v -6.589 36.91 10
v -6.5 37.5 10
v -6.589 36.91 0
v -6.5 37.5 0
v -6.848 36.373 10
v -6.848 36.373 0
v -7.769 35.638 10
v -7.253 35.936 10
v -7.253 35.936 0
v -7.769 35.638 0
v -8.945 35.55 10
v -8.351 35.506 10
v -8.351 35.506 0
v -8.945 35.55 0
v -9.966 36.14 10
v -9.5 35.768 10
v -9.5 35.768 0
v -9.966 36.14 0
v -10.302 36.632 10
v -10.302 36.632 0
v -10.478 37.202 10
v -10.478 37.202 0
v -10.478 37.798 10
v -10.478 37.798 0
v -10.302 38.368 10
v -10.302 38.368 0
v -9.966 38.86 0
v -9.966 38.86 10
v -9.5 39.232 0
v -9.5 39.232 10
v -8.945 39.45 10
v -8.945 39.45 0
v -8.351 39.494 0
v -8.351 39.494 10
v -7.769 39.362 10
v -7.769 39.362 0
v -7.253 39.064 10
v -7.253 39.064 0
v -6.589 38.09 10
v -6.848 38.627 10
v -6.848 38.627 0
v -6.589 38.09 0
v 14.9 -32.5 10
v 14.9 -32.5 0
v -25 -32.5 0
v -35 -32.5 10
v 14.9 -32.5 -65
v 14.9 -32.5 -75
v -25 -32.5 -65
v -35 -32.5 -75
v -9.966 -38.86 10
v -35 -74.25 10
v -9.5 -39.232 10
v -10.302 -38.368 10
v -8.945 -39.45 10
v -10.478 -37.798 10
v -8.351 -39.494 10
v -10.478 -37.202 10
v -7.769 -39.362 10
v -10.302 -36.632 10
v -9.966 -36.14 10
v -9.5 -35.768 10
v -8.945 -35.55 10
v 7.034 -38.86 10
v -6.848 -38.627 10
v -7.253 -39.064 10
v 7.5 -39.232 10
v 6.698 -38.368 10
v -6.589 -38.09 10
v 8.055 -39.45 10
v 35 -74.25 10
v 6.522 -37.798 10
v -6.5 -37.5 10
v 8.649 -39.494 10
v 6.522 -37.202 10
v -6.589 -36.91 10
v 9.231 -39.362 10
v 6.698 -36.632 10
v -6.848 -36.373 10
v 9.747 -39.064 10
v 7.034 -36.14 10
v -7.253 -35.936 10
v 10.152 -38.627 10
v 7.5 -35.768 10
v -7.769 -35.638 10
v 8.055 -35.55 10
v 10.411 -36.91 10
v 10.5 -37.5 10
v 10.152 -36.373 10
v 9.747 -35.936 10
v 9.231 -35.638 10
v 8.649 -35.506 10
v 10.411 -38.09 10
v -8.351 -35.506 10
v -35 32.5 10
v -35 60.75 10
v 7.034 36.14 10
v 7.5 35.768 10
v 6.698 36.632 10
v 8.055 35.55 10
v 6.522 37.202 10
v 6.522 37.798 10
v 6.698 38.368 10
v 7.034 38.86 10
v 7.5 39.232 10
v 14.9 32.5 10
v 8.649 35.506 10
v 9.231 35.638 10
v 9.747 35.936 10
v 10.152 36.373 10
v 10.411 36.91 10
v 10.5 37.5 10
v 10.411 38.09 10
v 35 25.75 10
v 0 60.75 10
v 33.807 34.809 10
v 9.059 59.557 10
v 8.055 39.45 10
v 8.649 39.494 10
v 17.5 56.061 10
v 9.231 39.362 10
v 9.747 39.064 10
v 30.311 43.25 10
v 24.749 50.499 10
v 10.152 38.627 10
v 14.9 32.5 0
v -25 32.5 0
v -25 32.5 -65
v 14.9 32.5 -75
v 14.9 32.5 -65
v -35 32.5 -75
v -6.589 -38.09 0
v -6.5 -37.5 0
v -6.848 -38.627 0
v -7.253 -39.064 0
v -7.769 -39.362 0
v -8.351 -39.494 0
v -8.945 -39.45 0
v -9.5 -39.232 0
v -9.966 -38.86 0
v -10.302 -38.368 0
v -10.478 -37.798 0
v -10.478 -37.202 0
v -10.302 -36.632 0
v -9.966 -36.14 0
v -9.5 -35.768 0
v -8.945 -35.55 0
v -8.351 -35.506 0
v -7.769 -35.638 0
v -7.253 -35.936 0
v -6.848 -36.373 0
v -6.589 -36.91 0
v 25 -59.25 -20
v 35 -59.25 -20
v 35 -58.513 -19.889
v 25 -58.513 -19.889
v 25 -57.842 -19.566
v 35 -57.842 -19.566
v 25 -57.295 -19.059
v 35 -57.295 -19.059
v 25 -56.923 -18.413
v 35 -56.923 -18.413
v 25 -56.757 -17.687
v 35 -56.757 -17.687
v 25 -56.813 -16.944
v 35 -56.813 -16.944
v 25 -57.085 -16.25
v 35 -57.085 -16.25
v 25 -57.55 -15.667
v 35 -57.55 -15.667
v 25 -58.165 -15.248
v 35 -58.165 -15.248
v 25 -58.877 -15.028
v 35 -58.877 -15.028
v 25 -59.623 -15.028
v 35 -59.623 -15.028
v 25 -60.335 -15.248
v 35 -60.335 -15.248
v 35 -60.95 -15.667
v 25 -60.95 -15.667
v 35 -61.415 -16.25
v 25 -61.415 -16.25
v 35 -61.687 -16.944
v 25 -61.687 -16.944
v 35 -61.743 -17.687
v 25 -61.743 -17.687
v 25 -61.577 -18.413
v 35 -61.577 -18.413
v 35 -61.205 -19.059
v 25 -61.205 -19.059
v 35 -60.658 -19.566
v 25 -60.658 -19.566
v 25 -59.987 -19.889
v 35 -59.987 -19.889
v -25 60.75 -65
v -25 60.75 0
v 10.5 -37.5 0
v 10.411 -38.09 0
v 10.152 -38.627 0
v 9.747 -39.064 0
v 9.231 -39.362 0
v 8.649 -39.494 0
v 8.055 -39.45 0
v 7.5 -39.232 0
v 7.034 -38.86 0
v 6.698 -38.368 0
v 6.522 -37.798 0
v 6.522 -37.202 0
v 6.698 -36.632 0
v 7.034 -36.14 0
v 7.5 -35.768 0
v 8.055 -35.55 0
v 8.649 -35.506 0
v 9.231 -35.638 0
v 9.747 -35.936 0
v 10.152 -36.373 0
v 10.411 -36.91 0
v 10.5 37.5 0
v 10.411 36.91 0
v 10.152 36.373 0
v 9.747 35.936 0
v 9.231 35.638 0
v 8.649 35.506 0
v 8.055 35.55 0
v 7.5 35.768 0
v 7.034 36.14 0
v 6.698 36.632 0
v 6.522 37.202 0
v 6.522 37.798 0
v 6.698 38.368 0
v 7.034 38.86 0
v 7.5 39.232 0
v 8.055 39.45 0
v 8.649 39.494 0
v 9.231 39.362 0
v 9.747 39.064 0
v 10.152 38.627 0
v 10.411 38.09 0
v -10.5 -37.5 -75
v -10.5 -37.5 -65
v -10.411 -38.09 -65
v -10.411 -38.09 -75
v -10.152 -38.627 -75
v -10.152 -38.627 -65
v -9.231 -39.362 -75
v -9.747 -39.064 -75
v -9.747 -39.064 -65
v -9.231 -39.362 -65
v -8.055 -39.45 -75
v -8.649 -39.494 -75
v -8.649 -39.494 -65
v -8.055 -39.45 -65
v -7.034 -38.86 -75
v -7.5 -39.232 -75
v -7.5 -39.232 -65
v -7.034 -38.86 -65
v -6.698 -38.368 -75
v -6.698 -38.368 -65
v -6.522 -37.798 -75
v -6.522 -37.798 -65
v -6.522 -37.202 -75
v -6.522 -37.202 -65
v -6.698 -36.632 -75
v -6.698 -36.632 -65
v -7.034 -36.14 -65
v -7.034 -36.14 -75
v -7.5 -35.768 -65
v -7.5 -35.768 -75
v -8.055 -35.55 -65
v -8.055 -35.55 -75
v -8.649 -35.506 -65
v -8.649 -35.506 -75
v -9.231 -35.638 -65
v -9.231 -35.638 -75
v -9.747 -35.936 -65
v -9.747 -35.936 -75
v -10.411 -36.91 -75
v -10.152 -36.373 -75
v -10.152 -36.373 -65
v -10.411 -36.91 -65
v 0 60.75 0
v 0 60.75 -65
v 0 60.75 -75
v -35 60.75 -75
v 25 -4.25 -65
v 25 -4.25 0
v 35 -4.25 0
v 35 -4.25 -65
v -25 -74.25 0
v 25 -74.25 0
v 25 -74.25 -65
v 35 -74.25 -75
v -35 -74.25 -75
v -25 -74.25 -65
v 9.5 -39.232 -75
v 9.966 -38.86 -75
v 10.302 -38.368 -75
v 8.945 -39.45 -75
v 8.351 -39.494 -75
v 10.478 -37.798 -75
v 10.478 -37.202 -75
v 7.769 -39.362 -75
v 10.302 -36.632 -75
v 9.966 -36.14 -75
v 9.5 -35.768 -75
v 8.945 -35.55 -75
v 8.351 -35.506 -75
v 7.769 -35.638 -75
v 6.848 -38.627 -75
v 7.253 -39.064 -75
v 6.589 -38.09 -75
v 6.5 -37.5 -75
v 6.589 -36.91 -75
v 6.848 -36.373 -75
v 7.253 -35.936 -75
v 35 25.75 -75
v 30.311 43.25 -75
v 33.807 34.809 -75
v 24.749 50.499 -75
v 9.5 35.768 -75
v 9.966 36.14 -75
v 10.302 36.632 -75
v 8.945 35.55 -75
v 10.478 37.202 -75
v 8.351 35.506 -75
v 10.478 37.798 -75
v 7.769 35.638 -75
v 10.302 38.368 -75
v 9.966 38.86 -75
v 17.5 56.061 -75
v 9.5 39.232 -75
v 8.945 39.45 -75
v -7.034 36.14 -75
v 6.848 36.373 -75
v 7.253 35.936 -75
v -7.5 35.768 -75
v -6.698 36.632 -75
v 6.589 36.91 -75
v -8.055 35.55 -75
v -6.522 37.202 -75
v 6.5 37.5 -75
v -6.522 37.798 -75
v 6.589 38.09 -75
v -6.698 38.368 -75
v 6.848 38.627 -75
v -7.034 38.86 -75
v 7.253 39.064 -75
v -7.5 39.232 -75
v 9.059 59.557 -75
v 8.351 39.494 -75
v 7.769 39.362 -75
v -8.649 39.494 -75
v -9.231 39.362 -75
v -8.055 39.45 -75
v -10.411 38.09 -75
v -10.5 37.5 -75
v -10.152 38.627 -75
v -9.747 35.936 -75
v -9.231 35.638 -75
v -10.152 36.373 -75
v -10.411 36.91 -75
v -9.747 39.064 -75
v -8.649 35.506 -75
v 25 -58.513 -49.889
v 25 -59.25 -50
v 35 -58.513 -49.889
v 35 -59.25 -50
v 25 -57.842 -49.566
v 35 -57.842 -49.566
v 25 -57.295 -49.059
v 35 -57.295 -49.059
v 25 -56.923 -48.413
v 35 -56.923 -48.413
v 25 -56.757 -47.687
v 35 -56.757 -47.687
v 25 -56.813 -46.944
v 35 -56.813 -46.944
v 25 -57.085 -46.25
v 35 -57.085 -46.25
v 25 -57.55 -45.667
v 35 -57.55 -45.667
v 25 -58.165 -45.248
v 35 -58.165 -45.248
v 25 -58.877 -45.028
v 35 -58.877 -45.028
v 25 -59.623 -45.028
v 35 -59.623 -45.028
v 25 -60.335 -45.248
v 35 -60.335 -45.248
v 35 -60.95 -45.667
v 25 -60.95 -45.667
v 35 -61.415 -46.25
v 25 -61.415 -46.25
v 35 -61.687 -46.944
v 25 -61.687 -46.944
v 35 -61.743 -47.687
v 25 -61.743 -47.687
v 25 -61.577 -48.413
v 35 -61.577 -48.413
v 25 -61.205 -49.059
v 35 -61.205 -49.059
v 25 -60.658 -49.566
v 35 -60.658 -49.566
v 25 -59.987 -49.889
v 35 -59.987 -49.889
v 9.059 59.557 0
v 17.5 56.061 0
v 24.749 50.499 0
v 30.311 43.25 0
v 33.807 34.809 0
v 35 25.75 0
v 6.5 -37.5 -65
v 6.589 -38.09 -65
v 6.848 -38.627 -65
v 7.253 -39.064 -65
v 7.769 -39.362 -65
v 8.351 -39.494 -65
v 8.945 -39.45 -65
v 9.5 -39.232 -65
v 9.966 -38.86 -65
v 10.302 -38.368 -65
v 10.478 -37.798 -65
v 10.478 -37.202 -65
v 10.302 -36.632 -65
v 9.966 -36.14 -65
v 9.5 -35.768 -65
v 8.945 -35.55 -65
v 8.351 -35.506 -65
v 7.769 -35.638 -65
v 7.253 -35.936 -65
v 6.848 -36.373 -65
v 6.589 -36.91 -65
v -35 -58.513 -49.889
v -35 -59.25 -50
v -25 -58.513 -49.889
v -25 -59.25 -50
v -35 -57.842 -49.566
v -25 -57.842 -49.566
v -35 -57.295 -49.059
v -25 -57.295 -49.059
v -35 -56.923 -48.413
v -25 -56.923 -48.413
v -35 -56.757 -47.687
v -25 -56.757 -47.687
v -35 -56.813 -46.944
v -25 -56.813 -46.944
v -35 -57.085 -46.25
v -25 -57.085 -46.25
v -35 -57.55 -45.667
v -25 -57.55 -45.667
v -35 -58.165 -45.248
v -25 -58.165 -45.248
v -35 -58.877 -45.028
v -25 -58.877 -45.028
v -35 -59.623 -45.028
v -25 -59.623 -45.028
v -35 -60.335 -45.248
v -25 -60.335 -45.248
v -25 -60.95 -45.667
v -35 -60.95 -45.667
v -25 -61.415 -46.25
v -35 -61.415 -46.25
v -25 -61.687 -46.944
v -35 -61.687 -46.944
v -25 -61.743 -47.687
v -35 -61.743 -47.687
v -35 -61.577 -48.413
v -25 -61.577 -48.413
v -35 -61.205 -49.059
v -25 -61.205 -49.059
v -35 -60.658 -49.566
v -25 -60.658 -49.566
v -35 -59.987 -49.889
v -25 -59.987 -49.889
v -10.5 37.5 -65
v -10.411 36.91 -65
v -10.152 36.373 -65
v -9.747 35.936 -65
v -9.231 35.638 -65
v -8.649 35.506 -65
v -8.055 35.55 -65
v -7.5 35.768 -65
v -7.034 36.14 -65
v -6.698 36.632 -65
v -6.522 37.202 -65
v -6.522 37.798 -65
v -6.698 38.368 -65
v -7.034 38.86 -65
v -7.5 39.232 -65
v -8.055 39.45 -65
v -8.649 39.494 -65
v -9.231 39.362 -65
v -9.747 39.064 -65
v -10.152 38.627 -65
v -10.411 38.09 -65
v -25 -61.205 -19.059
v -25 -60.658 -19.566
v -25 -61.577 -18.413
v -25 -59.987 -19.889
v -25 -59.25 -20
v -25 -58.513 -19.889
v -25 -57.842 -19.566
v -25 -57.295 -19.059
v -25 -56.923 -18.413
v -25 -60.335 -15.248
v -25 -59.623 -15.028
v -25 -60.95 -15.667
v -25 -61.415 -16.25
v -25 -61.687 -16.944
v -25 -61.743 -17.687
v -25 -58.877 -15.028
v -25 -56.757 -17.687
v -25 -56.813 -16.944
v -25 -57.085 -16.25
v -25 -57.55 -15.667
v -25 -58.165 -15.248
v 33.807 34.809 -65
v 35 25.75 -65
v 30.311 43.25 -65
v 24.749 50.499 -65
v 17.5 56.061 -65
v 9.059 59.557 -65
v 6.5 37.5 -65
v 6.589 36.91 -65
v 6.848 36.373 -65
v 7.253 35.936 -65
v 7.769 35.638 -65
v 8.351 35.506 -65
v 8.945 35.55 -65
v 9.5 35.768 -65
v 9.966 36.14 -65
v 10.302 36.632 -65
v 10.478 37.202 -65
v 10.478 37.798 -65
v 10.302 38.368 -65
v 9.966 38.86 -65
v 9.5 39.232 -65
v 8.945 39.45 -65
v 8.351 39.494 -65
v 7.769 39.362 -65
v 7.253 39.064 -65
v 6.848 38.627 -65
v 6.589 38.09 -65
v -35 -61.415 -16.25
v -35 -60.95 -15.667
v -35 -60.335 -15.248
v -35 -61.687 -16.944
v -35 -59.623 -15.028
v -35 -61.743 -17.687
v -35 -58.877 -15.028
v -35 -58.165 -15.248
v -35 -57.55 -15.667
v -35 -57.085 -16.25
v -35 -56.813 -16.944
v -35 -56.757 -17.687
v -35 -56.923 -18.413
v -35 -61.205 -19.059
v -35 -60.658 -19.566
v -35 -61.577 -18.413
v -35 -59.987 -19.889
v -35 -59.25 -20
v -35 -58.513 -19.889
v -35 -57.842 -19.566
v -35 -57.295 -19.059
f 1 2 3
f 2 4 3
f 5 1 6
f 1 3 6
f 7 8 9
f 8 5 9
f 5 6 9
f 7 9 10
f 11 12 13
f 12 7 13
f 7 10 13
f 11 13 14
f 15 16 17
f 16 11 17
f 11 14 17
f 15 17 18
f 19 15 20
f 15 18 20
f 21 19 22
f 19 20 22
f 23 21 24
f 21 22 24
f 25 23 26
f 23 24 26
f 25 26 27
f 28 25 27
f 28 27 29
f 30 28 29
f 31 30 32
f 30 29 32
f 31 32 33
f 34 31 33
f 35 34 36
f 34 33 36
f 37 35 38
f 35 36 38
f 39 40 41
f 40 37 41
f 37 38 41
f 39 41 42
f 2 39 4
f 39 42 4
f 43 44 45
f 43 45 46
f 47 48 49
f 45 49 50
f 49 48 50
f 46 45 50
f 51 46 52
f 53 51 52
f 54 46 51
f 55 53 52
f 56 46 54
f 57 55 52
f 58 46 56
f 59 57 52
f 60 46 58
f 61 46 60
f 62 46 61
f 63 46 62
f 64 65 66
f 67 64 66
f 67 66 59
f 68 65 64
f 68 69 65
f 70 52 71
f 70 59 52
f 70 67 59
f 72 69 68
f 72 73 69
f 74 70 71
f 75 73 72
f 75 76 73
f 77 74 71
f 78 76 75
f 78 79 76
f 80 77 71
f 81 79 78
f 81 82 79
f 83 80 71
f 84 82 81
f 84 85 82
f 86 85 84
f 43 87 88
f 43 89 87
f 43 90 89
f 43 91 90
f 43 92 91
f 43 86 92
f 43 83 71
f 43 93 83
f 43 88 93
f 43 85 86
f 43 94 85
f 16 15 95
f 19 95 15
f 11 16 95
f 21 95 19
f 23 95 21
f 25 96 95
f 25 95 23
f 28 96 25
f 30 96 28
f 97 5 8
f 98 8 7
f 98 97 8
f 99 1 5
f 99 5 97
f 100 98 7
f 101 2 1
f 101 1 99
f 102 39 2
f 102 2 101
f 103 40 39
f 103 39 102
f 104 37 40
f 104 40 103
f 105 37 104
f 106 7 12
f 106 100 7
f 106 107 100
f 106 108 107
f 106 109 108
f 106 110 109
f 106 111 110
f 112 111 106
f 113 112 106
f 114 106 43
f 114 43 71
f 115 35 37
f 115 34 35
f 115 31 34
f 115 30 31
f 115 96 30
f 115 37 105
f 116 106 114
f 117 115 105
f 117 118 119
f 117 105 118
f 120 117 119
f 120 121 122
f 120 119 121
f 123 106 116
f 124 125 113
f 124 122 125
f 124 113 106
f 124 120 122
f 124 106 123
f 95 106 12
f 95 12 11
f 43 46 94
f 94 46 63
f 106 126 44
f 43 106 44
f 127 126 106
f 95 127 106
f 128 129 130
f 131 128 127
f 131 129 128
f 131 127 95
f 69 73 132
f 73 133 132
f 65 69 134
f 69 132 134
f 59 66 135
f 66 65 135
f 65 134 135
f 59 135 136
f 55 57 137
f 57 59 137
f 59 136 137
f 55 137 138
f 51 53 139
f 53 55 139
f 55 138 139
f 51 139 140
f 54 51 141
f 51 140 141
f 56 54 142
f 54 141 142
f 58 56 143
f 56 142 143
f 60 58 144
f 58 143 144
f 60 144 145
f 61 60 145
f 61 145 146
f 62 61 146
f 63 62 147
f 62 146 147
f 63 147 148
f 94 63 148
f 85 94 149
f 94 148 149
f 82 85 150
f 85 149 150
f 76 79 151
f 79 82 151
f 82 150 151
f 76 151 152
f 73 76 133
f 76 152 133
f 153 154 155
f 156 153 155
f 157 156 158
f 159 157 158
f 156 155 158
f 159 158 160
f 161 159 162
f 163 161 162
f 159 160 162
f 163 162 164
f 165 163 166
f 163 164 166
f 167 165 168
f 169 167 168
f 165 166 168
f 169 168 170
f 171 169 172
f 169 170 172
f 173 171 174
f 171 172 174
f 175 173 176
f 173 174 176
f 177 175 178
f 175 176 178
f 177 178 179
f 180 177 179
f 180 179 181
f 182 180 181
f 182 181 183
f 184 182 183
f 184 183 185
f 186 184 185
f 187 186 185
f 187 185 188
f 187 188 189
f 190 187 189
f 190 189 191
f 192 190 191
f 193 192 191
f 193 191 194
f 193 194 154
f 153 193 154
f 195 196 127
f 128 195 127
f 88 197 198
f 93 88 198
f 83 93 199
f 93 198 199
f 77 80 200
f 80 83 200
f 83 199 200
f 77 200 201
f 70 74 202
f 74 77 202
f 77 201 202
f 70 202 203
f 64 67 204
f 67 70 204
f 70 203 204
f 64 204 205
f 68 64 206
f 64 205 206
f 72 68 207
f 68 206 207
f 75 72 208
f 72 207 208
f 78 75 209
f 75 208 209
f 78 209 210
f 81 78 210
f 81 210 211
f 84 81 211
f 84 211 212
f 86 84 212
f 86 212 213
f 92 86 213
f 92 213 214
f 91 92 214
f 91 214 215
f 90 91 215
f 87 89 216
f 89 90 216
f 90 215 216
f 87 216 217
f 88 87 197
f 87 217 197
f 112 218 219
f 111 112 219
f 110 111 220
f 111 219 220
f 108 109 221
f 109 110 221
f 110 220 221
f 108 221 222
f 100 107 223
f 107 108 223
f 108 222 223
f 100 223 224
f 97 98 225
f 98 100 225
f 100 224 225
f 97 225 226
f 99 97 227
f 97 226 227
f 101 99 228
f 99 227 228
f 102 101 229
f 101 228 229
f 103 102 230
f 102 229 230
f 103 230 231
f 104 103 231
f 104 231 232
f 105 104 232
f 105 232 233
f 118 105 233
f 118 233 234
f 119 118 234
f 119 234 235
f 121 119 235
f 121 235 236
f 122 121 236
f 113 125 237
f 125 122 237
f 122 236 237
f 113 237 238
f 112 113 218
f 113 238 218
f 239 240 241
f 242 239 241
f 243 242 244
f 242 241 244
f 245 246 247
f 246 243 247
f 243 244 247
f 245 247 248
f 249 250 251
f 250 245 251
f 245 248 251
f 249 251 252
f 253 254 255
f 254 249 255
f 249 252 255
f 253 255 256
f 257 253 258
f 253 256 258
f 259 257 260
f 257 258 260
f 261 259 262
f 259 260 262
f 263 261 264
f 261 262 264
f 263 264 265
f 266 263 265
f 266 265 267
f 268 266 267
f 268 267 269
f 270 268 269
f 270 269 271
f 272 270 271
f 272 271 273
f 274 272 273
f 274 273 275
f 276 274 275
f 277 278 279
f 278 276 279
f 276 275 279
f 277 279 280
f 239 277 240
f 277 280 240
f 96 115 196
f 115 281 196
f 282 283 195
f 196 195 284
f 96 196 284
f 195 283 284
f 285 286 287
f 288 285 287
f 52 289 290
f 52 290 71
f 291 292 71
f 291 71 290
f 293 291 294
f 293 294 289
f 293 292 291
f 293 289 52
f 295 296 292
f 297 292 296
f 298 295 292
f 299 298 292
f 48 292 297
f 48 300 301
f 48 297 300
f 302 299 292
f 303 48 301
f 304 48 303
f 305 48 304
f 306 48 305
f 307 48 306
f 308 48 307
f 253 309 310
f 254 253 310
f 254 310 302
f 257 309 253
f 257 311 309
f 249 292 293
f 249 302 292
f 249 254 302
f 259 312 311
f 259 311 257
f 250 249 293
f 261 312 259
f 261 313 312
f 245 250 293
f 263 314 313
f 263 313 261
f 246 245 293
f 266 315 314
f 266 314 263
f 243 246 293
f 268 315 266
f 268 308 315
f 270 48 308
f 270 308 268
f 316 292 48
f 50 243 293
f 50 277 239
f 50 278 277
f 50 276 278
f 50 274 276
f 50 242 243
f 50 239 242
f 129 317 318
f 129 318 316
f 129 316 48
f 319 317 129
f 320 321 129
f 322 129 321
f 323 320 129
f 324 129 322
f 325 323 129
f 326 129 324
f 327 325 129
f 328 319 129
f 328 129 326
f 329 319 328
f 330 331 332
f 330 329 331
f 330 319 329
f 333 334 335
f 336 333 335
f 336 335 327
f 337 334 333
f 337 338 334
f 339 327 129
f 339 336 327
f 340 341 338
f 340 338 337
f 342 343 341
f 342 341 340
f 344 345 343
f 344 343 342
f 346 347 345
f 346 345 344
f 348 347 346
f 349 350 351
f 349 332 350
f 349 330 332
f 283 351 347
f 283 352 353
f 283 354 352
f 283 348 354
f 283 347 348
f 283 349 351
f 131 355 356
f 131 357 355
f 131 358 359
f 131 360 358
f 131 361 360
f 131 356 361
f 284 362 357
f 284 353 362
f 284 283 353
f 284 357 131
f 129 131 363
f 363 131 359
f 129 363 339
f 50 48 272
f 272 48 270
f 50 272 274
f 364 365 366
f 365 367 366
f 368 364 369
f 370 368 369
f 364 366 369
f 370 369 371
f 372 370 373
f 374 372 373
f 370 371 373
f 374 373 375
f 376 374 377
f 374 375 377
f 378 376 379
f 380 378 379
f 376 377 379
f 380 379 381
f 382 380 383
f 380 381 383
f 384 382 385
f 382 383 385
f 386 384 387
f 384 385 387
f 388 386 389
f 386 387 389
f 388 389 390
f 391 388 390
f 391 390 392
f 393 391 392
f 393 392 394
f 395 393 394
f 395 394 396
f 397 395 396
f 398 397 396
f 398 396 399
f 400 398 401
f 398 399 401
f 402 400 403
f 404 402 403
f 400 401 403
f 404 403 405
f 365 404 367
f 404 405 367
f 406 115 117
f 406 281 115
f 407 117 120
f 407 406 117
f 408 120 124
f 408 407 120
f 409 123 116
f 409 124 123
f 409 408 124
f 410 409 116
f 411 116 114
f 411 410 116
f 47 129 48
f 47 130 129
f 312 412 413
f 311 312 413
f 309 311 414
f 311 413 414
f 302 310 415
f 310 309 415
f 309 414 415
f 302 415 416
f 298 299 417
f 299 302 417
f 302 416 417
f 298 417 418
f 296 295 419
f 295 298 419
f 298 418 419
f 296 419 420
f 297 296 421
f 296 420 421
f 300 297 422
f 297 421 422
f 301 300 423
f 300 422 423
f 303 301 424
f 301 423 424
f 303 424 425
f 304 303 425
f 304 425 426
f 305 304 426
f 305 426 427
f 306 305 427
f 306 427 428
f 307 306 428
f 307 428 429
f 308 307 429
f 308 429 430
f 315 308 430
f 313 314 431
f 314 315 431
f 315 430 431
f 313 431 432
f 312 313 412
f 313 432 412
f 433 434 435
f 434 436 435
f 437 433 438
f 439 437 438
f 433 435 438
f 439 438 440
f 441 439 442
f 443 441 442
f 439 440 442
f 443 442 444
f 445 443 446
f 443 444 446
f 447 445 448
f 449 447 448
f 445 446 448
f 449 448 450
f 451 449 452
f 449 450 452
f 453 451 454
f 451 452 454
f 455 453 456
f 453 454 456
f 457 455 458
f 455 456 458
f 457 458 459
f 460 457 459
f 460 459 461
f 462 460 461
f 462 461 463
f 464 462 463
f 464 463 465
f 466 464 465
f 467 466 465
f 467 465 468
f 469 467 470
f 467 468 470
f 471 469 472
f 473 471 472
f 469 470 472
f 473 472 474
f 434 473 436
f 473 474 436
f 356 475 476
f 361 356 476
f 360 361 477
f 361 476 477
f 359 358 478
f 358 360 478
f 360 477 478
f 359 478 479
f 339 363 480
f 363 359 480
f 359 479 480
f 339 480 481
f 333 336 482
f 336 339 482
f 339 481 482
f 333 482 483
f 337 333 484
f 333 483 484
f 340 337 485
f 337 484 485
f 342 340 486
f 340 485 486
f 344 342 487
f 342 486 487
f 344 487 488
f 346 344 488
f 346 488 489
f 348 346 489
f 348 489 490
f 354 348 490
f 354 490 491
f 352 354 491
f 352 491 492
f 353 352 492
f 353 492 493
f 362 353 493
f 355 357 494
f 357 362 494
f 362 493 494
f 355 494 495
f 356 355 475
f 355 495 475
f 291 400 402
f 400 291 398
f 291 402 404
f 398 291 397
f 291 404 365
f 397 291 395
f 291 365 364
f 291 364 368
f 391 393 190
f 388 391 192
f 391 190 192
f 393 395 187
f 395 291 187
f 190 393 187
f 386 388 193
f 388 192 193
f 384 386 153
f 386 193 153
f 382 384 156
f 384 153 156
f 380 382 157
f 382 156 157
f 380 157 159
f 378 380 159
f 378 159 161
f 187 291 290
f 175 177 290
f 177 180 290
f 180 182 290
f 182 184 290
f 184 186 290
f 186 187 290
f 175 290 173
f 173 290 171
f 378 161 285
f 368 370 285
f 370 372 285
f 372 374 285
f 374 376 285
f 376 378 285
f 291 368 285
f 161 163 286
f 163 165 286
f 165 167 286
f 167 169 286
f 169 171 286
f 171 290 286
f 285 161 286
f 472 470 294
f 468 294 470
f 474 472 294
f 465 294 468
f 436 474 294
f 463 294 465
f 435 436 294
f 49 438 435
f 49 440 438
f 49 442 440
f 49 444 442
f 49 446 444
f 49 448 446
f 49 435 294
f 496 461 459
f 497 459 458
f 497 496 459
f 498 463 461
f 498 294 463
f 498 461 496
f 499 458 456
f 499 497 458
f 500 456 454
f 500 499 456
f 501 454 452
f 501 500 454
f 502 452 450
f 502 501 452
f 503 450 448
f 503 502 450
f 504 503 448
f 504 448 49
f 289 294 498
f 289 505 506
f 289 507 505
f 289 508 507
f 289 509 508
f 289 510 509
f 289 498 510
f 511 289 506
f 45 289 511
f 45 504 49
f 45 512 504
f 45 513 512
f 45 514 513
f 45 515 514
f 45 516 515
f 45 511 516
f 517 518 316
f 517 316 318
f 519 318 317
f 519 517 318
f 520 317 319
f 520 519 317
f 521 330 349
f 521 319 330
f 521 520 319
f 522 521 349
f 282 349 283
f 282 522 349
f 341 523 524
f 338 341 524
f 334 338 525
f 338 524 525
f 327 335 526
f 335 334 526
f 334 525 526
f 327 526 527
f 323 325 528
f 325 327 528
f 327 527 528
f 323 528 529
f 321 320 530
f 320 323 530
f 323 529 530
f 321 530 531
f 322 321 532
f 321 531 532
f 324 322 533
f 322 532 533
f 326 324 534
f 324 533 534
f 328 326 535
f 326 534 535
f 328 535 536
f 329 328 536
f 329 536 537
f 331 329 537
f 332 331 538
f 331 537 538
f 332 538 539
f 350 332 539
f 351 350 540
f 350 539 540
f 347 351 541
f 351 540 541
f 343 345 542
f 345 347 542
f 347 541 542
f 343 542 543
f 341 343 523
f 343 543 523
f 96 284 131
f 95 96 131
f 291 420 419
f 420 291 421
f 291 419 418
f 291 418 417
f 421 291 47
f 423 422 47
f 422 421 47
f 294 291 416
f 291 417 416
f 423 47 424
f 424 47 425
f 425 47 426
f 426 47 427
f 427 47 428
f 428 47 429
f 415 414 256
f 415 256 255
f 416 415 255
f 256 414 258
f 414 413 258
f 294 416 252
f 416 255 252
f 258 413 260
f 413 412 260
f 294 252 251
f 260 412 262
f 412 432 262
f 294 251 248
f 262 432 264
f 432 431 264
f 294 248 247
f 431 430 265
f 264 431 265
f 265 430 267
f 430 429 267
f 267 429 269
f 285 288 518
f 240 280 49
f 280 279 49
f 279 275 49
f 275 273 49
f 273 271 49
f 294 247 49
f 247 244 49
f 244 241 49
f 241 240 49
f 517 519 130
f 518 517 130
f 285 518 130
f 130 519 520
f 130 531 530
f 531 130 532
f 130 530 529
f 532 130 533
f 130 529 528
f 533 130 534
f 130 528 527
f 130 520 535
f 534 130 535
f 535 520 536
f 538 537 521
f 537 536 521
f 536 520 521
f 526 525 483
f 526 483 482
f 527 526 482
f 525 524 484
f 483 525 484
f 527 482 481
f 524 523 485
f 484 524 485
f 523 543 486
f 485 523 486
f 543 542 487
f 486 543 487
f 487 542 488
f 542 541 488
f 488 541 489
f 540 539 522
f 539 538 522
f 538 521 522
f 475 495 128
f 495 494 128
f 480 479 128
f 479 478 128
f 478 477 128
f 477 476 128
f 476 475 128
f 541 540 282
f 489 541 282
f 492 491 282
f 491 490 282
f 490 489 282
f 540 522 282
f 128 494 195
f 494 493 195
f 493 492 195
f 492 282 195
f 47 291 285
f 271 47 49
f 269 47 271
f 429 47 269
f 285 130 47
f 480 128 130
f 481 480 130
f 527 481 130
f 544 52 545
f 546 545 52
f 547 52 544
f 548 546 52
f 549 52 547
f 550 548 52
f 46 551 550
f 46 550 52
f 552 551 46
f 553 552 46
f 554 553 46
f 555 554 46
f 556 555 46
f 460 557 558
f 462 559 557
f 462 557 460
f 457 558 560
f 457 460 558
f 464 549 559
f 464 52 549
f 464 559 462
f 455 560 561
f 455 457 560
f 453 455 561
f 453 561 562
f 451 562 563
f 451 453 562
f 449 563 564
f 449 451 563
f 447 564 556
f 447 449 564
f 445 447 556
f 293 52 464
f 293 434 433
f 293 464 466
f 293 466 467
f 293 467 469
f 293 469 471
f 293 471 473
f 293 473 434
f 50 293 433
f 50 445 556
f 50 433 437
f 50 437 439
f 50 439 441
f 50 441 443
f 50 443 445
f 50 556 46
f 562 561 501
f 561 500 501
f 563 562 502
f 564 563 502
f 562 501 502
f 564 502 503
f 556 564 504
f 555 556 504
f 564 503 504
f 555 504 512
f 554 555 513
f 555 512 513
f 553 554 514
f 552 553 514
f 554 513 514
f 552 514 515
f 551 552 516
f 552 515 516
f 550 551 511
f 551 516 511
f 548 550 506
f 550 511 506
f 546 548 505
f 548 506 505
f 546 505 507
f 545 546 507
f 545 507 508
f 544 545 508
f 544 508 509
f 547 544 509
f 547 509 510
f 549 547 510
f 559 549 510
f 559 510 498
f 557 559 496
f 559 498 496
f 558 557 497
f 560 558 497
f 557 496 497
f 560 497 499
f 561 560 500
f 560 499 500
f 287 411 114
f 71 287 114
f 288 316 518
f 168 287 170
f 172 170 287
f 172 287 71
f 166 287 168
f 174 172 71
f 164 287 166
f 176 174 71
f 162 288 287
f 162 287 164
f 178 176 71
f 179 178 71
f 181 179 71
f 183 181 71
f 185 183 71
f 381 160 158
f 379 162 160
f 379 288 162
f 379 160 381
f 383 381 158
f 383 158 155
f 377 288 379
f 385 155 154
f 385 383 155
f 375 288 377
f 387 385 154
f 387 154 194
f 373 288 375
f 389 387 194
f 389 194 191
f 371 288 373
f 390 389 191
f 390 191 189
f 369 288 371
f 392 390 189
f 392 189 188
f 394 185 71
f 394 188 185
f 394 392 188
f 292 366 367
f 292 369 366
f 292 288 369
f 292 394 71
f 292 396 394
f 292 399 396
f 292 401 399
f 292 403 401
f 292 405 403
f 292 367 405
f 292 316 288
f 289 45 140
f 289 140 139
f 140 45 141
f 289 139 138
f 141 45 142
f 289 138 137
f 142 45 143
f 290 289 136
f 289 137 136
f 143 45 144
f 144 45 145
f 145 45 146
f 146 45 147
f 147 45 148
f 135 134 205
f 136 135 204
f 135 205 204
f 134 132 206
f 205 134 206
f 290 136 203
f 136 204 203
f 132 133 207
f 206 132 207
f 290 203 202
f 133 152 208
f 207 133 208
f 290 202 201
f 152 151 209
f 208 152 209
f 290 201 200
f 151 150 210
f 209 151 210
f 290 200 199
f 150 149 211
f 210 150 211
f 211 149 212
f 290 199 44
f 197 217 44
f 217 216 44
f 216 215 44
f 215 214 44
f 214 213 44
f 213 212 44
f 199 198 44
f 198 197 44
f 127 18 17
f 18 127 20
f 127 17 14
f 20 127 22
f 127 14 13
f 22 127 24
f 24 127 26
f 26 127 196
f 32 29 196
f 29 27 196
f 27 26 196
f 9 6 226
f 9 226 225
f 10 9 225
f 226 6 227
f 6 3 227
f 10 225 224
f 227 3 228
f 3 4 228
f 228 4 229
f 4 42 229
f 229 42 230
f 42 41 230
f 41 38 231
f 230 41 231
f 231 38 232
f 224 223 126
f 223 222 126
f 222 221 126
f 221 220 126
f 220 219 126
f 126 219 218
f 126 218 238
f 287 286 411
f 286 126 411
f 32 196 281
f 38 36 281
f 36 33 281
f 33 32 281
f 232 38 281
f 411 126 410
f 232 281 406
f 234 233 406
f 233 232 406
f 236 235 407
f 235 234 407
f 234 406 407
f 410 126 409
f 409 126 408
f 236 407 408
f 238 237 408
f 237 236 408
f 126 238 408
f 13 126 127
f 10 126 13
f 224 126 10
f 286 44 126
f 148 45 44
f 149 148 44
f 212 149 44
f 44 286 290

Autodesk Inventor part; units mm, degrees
ref_plane "YZ Plane" through (0, 0, 0) normal (1, 0, 0) x (0, 1, 0)
ref_plane "XZ Plane" through (0, 0, 0) normal (0, 1, 0) x (-1, 0, 0)
sketch "Sketch1" plane through (0, 0, 0) normal (0, 0, 1) x (1, 0, 0)
  line L0 (0, 37.5) -> (8.5, 37.5) construction
  circle A0 centre (8.5, 37.5) radius 2
  line L1 (8.5, 37.5) -> (-8.5, 37.5) construction
  line L2 (-8.5, 37.5) -> (-8.5, -37.5) construction
  line L3 (-8.5, -37.5) -> (8.5, -37.5) construction
  line L4 (8.5, -37.5) -> (8.5, 37.5) construction
  circle A1 centre (8.5, -37.5) radius 2
  line L5 (-8.5, 37.5) -> (8.5, -37.5) construction
  line L6 (-14.9, 32.5) -> (14.9, 32.5)
  line L7 (14.9, 32.5) -> (14.9, -32.5)
  line L8 (14.9, -32.5) -> (-14.9, -32.5)
  line L9 (-14.9, 32.5) -> (14.9, -32.5) construction
  line L10 (14.9, 32.5) -> (-14.9, -32.5) construction
  circle A2 centre (-8.5, -37.5) radius 2
  circle A3 centre (-8.5, 37.5) radius 2
  arc A4 (-8.5, -20) -> (-9.1777, -20.0184) centre (-8.5, -32.5) ccw
  line L11 (0, 19) -> (0, 0) construction
  line L12 (0, 32.5) -> (0, 19) construction
  line L13 (35, 25.75) -> (35, -74.25)
  line L14 (35, -74.25) -> (-35, -74.25)
  line L15 (-35, -74.25) -> (-35, -32.5)
  arc A5 (35, 25.75) -> (0, 60.75) centre (0, 25.75) ccw
  line L16 (0, 60.75) -> (-35, 60.75)
  line L17 (-35, 60.75) -> (-35, 32.5)
  line L18 (-14.9, -32.5) -> (-35, -32.5)
  line L19 (-14.9, 32.5) -> (-35, 32.5)
  point P0 (8.5, -32.5)
  dimension "d0" = 8.5
  dimension "d1" = 4
  dimension "d2" = 17
  dimension "d3" = 75
  dimension "d4" = 4
  dimension "d5" = 29.8
  dimension "d6" = 65
  dimension "d7" = 4
  dimension "d8" = 4
  dimension "d9" = 13.5
  dimension "d12" = 100
  dimension "d15" = 35
extrude "Extrusion1" add sketch "Sketch1" along normal blind 10
ref_plane "Work Plane1" through (0, 0, -65) normal (0, 0, -1) x (-1, 0, 0)
sketch "Sketch2" plane through (0, 0, -65) normal (0, 0, -1) x (-1, 0, 0)
  line L0 (35, -32.5) -> (35, -74.25) projected
  arc A0 (0, 60.75) -> (-35, 25.75) centre (0, 25.75) ccw projected
  line L1 (-35, -74.25) -> (-35, 25.75) projected
  line L2 (35, -74.25) -> (-35, -74.25) projected
  circle A1 centre (-8.5, -37.5) radius 2 projected
  circle A2 centre (8.5, -37.5) radius 2 projected
  circle A3 centre (8.5, 37.5) radius 2 projected
  circle A4 centre (-8.5, 37.5) radius 2 projected
  line L3 (-14.9, 32.5) -> (-14.9, -32.5) projected
  line L4 (35, 32.5) -> (-14.9, 32.5) projected
  line L5 (-14.9, -32.5) -> (35, -32.5) projected
  line L6 (35, 60.75) -> (35, 32.5) projected
  line L7 (0, 60.75) -> (35, 60.75) projected
  point P0 (0, 0)
extrude "Extrusion2" add sketch "Sketch2" along normal blind 10
sketch "Sketch3" plane through (0, 0, 0) normal (0, 0, -1) x (-1, 0, 0)
  line L0 (-35, -74.25) -> (-35, 25.75) projected
  line L1 (-35, -74.25) -> (-25, -74.25)
  line L2 (-25, -74.25) -> (-25, -4.25)
  line L3 (-25, -4.25) -> (-35, -4.25)
  line L4 (-35, -4.25) -> (-35, -74.25)
  line L5 (35, -74.25) -> (-35, -74.25) projected
  line L6 (-14.9, -32.5) -> (35, -32.5) projected
  line L7 (35, -74.25) -> (25, -74.25)
  line L8 (25, -74.25) -> (25, -32.5)
  line L9 (25, -32.5) -> (35, -32.5)
  line L10 (35, -32.5) -> (35, -74.25)
  line L11 (35, 60.75) -> (35, 32.5) projected
  line L12 (35, 32.5) -> (-14.9, 32.5) projected
  line L13 (35, 60.75) -> (25, 60.75)
  line L14 (25, 60.75) -> (25, 32.5)
  line L15 (25, 32.5) -> (35, 32.5)
  line L16 (35, 32.5) -> (35, 60.75)
  point P0 (0, 0)
  point P1 (-35, -4.25)
  dimension "d19" = 10
  dimension "d23" = 70
  dimension "d24" = 10
  dimension "d25" = 10
extrude "Extrusion3" add sketch "Sketch3" along normal up to next
sketch "Sketch4" plane through (35, 0, 10) normal (1, 0, 0) x (0, 0, -1)
  line L0 (85, 25.75) -> (85, -74.25) projected
  line L1 (0, -32.5) -> (0, -74.25) projected
  line L2 (85, -74.25) -> (0, -74.25)
  line L3 (0, -74.25) -> (0, -44.25)
  line L4 (0, -44.25) -> (85, -44.25)
  line L5 (85, -44.25) -> (85, -74.25)
  line L6 (0, -74.25) -> (85, -74.25) construction
  line L7 (85, -44.25) -> (0, -74.25) construction
  line L8 (42.5, -59.25) -> (57.5, -59.25) construction
  line L9 (42.5, -59.25) -> (27.5, -59.25) construction
  circle A0 centre (57.5, -59.25) radius 2.5
  circle A1 centre (27.5, -59.25) radius 2.5
  point P0 (10, 0)
  dimension "d26" = 30
  dimension "d27" = 15
  dimension "d28" = 15
  dimension "d29" = 5
  dimension "d30" = 5
extrude "Extrusion4" cut sketch "Sketch4" against normal blind 90 contours A0 | A1
properties part number "Joint_3_House" material "Acrylic, Clear"
